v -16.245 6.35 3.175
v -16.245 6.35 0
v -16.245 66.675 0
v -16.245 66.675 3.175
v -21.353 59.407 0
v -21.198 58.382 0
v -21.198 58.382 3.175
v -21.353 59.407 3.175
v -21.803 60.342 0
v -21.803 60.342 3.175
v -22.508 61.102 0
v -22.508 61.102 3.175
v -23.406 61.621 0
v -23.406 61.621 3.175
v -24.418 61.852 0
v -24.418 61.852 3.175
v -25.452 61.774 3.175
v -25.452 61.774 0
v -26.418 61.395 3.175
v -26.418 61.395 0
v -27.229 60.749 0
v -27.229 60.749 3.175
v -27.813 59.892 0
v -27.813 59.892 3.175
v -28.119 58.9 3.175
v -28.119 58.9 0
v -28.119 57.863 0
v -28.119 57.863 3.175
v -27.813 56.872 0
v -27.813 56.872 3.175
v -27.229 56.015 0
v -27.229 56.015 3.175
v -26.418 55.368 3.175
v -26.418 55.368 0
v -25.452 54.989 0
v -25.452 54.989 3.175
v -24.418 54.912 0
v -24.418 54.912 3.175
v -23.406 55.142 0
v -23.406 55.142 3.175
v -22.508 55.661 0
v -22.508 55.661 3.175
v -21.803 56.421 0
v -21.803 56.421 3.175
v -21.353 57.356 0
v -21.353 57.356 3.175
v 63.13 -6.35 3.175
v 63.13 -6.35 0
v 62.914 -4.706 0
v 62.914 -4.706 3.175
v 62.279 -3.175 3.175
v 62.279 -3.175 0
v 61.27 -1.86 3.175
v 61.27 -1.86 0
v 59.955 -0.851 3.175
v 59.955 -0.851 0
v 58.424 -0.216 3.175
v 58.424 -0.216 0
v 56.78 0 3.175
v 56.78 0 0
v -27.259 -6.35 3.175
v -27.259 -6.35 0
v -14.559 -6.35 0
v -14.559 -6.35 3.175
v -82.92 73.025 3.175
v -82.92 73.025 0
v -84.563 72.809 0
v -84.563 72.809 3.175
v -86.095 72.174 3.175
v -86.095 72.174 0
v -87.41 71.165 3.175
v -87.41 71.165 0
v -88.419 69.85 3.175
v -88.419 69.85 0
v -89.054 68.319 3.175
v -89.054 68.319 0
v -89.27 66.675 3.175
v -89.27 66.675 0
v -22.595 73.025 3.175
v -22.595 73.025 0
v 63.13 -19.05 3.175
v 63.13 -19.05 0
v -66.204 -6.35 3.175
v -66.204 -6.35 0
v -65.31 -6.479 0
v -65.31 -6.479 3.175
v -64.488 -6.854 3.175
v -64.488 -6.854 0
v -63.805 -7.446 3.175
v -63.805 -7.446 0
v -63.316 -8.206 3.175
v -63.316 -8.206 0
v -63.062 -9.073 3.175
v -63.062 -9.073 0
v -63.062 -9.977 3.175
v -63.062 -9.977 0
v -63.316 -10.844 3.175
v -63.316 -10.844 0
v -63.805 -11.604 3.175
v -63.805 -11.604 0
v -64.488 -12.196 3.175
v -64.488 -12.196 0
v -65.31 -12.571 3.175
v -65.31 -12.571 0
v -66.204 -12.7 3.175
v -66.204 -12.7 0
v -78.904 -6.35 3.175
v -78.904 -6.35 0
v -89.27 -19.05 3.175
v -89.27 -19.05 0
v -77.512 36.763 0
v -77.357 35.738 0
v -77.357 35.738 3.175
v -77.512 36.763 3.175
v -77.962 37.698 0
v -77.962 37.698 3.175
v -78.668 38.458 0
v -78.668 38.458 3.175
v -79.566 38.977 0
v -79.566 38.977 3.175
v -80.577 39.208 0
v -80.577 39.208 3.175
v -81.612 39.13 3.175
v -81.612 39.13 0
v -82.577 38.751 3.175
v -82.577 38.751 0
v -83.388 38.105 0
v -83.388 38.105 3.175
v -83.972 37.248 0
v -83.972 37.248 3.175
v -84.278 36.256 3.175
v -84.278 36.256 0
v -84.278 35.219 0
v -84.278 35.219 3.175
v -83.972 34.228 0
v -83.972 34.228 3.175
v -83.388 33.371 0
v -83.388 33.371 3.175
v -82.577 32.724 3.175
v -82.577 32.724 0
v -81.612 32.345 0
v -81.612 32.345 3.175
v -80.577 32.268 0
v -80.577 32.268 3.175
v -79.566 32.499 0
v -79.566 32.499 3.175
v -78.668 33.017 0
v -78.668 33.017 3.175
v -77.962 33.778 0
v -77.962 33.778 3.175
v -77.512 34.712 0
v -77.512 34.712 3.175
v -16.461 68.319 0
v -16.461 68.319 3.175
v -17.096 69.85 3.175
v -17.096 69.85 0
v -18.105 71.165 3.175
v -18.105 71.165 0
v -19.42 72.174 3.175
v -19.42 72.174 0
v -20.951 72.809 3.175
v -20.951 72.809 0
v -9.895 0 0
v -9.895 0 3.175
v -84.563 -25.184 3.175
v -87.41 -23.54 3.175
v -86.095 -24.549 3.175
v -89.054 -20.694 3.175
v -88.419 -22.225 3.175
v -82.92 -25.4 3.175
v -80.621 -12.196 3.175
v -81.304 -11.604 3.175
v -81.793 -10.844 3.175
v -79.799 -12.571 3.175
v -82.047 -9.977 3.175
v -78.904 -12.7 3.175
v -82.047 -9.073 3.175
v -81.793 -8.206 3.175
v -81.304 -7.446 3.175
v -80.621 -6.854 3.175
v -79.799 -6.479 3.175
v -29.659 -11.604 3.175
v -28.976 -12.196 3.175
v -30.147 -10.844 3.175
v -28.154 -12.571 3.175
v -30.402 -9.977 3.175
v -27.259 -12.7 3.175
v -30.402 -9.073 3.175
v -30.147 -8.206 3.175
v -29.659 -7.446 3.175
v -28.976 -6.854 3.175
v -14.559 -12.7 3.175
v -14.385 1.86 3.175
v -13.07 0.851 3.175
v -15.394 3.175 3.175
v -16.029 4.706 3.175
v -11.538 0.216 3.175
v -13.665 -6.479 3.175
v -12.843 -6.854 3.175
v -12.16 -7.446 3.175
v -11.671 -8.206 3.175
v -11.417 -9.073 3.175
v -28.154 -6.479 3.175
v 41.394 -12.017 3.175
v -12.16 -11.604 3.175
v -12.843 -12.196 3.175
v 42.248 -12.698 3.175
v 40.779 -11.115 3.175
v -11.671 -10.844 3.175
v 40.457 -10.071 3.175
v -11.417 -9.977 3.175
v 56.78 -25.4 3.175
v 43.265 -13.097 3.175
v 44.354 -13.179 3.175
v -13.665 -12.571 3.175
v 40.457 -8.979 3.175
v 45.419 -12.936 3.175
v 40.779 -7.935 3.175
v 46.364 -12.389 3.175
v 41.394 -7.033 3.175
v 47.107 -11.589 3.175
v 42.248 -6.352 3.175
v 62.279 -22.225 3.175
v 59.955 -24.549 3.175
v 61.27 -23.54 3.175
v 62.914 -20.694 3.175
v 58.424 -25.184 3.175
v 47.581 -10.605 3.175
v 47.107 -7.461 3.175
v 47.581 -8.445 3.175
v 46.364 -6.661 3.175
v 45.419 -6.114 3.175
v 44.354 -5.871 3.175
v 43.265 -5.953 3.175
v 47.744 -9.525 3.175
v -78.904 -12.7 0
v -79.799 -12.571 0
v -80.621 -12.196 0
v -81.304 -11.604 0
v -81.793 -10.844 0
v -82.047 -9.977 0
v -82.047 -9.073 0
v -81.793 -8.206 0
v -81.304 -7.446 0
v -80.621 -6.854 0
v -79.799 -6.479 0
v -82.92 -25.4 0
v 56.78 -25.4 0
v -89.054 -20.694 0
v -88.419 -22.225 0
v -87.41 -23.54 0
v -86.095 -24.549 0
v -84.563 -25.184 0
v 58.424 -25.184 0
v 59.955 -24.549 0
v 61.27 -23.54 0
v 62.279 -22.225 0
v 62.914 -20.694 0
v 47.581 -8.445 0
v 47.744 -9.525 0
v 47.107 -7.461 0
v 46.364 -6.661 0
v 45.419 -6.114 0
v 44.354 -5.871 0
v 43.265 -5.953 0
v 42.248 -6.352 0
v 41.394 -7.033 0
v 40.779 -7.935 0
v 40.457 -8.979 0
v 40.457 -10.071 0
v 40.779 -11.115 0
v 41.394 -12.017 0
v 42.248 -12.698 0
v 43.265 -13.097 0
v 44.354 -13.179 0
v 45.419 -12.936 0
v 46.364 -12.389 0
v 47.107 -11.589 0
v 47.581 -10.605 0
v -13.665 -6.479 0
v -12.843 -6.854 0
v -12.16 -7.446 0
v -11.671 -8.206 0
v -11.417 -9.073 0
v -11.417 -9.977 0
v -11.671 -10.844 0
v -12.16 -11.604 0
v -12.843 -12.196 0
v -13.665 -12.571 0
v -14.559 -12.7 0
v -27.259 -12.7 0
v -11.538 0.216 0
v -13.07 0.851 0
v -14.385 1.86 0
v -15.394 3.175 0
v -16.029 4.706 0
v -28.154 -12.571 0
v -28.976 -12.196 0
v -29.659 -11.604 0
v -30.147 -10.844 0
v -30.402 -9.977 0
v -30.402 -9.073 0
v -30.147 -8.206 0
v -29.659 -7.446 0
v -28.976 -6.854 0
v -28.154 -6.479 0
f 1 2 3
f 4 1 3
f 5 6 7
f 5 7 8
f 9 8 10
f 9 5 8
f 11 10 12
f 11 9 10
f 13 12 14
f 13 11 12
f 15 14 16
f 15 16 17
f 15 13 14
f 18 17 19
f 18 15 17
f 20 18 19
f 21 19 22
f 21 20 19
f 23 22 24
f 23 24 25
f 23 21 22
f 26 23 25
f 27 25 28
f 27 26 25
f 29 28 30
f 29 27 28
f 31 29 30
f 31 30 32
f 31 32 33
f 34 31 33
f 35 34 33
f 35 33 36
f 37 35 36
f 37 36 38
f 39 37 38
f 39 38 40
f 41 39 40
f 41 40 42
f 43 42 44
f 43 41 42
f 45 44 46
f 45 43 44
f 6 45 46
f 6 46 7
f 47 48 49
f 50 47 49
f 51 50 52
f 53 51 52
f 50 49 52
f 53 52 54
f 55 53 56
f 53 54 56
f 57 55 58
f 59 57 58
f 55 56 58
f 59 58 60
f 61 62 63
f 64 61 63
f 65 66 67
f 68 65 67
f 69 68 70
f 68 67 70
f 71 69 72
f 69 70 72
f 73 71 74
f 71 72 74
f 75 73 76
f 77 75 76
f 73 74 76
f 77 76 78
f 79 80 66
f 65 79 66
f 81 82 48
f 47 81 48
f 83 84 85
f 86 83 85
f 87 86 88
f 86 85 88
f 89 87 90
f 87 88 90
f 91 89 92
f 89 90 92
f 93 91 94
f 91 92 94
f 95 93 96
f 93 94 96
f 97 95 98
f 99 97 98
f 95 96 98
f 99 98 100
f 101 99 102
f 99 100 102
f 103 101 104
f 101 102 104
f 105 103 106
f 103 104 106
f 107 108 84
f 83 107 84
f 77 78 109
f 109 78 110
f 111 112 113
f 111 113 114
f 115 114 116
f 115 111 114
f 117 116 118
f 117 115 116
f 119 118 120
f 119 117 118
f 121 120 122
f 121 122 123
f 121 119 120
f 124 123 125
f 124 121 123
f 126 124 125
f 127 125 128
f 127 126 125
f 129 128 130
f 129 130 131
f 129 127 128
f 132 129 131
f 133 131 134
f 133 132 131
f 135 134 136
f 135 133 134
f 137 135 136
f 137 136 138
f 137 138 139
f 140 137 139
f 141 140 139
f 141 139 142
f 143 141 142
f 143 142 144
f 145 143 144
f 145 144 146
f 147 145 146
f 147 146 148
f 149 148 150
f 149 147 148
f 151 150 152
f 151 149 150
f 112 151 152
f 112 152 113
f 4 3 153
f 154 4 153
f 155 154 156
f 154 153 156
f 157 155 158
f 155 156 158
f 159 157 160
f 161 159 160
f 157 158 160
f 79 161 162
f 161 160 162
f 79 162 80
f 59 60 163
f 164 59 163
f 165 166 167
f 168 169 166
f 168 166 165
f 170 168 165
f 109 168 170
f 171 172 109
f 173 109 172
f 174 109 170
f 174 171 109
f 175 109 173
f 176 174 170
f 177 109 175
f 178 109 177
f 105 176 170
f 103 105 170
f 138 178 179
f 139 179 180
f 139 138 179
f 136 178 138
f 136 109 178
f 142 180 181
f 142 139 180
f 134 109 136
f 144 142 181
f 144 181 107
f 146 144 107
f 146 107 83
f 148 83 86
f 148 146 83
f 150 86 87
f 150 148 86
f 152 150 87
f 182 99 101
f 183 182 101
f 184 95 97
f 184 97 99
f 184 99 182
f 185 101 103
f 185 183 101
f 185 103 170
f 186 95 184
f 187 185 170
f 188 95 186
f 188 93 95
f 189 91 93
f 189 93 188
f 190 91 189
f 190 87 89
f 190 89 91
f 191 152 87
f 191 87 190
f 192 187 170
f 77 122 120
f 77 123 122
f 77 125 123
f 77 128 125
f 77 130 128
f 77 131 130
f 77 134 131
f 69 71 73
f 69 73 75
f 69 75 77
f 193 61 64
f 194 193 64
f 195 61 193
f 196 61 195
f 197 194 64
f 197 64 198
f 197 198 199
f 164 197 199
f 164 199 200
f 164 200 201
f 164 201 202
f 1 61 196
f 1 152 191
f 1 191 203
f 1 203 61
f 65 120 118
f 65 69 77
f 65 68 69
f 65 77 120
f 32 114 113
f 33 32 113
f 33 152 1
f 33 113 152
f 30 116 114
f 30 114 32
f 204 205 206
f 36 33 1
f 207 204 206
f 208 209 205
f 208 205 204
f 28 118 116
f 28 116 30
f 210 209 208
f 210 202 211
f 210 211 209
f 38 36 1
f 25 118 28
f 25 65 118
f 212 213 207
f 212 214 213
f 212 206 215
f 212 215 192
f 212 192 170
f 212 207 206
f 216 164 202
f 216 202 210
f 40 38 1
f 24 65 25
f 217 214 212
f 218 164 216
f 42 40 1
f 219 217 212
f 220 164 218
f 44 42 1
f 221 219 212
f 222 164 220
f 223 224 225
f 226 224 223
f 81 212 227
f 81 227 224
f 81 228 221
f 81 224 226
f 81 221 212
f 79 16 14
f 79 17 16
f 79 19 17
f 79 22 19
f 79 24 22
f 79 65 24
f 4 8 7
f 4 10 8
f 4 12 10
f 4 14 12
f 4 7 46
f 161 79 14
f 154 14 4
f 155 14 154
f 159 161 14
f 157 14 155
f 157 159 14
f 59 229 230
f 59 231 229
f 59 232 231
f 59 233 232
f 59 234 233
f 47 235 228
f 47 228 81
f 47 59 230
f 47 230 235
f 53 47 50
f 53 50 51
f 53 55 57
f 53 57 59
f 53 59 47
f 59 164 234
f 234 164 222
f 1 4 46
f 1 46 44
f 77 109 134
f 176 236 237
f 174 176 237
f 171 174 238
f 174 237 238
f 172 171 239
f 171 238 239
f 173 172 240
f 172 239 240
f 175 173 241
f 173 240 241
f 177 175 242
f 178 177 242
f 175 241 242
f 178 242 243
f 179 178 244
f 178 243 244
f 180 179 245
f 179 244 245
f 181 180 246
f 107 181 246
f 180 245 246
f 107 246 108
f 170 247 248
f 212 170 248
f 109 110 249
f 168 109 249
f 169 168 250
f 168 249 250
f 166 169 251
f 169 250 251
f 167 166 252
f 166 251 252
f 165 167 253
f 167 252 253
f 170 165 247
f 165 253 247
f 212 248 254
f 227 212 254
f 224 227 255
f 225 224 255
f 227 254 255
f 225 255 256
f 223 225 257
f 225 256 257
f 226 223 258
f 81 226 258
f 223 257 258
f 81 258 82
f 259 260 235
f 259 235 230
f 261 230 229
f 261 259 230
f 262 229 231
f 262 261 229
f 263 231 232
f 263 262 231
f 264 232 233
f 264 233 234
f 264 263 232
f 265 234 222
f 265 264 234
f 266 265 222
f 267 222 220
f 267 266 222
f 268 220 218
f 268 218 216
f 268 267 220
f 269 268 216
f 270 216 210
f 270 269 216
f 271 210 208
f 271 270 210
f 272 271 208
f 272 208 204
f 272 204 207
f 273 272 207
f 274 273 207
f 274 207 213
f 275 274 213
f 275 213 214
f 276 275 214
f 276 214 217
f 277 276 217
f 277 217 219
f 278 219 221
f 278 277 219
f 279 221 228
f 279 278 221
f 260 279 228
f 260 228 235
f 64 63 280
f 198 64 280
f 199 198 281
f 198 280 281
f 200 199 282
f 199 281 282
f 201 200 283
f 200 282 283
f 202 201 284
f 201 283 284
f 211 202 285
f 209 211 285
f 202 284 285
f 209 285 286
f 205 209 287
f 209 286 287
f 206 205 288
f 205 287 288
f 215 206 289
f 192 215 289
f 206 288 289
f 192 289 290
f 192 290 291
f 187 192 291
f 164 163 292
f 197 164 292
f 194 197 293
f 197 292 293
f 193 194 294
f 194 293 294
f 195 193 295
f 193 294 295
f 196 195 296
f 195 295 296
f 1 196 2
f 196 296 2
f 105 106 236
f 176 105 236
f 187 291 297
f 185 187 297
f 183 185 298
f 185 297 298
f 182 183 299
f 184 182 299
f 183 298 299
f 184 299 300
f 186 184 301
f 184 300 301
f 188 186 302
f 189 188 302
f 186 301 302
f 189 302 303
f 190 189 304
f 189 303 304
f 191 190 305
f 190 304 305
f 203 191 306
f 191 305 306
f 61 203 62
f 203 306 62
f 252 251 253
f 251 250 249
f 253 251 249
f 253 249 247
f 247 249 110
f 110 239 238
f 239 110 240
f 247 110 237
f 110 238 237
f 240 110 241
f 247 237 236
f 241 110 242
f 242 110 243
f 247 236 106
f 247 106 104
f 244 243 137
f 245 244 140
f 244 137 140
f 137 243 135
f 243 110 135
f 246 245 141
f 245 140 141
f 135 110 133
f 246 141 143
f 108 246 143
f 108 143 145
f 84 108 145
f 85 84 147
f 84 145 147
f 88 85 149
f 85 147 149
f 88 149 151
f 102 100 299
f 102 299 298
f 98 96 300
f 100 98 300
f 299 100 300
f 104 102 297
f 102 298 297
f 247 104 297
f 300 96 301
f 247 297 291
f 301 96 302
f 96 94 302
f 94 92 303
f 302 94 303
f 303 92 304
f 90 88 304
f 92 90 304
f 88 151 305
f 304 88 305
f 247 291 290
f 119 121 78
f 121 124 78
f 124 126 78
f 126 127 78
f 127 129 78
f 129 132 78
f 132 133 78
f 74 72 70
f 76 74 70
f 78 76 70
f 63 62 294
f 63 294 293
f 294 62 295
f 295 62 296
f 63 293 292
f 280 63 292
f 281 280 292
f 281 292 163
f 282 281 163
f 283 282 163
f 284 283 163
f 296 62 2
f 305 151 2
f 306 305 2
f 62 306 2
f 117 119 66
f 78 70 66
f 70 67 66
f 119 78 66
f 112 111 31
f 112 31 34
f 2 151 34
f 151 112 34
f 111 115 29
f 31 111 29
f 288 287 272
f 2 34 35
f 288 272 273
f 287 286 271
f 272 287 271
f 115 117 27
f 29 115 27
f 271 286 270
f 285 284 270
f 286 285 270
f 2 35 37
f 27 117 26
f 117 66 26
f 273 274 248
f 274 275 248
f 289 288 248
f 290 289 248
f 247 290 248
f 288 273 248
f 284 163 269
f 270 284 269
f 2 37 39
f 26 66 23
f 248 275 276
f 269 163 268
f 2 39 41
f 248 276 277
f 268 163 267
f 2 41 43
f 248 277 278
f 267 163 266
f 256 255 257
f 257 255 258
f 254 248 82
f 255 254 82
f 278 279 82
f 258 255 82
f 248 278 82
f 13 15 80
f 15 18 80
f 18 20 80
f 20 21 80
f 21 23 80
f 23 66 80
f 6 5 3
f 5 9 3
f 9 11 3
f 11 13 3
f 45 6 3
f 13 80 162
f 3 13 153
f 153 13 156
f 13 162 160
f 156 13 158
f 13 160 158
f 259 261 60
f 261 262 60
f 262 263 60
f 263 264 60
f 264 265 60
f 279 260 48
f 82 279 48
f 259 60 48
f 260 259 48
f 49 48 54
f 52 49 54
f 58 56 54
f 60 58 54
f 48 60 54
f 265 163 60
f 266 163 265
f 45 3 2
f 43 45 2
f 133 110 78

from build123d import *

# Parameters (mm, degrees)
F0_R     = 3.663821
F0_R_2   = 3.4798
F1_DEPTH = 3.175


with BuildPart() as f1:
    # F0 (on Top) → F1 (new body)
    with BuildSketch(Plane.XY):
        with BuildLine():
            ThreePointArc((-89.269999, -19.05), (-87.410127, -23.540128), (-82.919999, -25.4))
            Line((-82.919999, -25.4), (56.780001, -25.4))
            ThreePointArc((56.780001, -25.4), (61.270129, -23.540128), (63.130001, -19.05))
            Line((63.130001, -19.05), (63.130001, -6.35))
            ThreePointArc((63.130001, -6.35), (61.270129, -1.859872), (56.780001, 0))
            Line((56.780001, 0), (-9.894999, 0))
            ThreePointArc((-9.894999, 0), (-14.385127, 1.859872), (-16.244999, 6.35))
            Line((-16.244999, 6.35), (-16.244999, 66.675))
            ThreePointArc((-16.244999, 66.675), (-18.104871, 71.165128), (-22.594999, 73.025))
            Line((-22.594999, 73.025), (-82.919999, 73.025))
            ThreePointArc((-82.919999, 73.025), (-87.410127, 71.165128), (-89.269999, 66.675))
            Line((-89.269999, 66.675), (-89.269999, -19.05))
        make_face()
        with BuildLine():
            Line((-66.204435, -12.7), (-78.904435, -12.7))
            ThreePointArc((-78.904435, -12.7), (-82.079435, -9.525), (-78.904435, -6.35))
            Line((-78.904435, -6.35), (-66.204435, -6.35))
            ThreePointArc((-66.204435, -6.35), (-63.029435, -9.525), (-66.204435, -12.7))
        make_face(mode=Mode.SUBTRACT)
        with BuildLine():
            Line((-14.559238, -12.7), (-27.259238, -12.7))
            ThreePointArc((-27.259238, -12.7), (-30.434238, -9.525), (-27.259238, -6.35))
            Line((-27.259238, -6.35), (-14.559238, -6.35))
            ThreePointArc((-14.559238, -6.35), (-11.384238, -9.525), (-14.559238, -12.7))
        make_face(mode=Mode.SUBTRACT)
        with Locations((44.080001, -9.525)):
            Circle(F0_R, mode=Mode.SUBTRACT)
        with Locations((-80.837199, 35.7378)):
            Circle(F0_R_2, mode=Mode.SUBTRACT)
        with Locations((-24.677799, 58.381684)):
            Circle(F0_R_2, mode=Mode.SUBTRACT)
    extrude(amount=F1_DEPTH)


solid = f1.part
